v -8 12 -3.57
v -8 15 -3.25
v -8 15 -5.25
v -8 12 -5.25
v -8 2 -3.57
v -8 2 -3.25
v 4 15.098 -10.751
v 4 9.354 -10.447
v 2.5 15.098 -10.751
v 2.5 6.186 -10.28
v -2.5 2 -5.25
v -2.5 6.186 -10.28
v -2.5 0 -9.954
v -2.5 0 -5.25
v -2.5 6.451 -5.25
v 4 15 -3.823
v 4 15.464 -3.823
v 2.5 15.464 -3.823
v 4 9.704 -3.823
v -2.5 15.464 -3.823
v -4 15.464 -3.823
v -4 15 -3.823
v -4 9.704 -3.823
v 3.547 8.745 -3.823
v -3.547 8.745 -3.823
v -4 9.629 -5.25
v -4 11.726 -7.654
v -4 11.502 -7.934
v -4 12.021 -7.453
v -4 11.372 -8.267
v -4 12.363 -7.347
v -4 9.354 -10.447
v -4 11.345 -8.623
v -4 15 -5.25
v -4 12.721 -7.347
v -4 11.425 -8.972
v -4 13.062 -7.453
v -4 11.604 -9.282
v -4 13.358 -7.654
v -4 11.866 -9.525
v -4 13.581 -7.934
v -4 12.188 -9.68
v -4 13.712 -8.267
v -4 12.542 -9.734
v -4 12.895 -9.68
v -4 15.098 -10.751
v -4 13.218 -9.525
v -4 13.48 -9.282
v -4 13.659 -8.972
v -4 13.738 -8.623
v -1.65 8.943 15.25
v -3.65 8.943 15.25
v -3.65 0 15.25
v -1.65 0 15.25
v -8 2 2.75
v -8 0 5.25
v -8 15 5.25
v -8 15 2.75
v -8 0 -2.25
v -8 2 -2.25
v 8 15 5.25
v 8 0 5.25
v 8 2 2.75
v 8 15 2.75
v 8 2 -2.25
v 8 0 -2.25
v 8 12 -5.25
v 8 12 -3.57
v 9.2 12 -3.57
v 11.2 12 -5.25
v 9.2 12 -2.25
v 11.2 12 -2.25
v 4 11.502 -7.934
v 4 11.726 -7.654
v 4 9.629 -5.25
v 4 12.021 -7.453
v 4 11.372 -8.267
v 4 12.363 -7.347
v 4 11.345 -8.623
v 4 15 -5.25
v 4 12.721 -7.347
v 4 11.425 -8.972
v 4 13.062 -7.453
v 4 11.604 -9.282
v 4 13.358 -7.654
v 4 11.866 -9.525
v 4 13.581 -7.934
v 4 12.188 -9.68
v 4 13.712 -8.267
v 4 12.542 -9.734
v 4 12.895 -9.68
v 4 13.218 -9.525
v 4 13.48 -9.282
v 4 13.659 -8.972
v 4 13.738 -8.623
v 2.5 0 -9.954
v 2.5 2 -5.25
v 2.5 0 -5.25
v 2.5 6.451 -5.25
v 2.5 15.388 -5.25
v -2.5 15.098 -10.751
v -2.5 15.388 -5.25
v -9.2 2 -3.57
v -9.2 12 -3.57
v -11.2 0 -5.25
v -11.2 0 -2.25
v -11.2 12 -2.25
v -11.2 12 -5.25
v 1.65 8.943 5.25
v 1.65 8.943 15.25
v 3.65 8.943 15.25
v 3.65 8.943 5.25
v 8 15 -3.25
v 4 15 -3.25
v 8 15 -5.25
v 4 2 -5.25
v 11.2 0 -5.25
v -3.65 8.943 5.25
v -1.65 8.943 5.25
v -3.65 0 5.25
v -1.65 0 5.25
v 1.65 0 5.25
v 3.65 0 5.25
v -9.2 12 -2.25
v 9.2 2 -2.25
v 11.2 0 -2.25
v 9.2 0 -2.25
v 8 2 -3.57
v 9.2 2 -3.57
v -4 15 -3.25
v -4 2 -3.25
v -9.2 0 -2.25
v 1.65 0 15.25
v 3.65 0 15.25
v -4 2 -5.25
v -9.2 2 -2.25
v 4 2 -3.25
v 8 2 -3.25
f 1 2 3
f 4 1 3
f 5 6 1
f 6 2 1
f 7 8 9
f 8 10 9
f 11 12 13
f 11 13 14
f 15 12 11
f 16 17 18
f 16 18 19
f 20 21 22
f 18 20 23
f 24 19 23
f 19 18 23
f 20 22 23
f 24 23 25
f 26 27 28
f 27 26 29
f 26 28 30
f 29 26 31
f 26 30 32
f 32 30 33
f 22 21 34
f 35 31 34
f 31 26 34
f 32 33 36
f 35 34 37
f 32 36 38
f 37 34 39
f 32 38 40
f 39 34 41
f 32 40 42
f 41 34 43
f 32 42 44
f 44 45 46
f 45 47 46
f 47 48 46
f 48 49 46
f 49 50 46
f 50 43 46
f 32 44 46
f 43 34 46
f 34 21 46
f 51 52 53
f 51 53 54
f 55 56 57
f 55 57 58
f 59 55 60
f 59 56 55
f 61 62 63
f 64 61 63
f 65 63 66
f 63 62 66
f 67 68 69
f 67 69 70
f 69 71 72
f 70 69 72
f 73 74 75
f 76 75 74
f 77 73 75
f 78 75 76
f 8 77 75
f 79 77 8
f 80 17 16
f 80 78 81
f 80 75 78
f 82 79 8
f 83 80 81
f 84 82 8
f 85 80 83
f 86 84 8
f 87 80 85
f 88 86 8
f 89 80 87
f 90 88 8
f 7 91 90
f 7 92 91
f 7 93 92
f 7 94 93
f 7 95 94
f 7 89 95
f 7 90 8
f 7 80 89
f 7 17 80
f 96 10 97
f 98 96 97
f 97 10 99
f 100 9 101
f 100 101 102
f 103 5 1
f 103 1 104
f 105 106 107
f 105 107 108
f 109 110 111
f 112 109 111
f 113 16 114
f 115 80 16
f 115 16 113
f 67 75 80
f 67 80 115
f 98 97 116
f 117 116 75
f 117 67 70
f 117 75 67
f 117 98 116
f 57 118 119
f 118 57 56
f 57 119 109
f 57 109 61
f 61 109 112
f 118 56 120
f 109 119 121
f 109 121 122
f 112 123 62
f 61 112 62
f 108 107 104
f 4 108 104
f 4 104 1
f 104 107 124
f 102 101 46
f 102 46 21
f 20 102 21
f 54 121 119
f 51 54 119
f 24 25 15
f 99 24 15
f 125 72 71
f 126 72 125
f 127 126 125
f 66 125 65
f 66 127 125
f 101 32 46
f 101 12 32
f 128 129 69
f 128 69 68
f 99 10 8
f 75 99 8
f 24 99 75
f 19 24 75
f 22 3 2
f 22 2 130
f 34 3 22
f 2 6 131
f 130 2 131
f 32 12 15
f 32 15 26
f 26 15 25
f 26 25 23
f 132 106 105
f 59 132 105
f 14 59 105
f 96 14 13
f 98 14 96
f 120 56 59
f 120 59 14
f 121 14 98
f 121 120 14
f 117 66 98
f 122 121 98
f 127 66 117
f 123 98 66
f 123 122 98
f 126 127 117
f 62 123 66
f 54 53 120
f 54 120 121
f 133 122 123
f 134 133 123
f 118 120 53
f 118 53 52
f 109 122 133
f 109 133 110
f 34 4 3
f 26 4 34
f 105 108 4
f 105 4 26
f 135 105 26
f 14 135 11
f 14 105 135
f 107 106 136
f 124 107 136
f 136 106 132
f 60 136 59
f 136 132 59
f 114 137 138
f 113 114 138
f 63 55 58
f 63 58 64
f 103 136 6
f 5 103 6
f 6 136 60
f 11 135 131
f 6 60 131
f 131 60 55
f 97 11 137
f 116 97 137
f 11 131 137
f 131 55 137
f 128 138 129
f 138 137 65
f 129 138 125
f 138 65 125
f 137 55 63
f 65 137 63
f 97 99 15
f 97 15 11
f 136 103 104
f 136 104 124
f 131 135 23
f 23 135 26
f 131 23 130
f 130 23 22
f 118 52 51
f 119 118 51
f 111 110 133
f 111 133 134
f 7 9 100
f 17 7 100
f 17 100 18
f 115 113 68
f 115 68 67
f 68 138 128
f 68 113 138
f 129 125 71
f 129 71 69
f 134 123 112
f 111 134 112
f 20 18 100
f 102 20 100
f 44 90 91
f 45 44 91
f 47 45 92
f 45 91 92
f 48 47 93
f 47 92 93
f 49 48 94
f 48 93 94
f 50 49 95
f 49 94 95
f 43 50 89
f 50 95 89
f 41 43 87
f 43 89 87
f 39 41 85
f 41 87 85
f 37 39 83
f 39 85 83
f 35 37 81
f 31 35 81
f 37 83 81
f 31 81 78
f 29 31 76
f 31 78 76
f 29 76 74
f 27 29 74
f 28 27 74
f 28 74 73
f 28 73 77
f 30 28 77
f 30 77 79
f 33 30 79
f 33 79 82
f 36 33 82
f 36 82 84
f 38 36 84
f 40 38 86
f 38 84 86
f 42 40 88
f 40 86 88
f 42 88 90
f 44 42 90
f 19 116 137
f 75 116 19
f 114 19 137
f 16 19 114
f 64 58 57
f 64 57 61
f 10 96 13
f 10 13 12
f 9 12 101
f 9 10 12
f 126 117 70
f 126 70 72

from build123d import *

# Parameters (mm, degrees)
SKETCH_1_W          = 16
SKETCH_1_H          = 6
EXTRUDE_1_DEPTH     = 2
SKETCH_1_3_W        = 16
SKETCH_1_3_H        = 2
SKETCH_1_3_H_2      = 2.5
EXTRUDE_2_DEPTH     = 15
SKETCH_2_W          = 8
SKETCH_2_H          = 26
CUT_EXTRUDE_1_DEPTH = 2
EXTRUDE_3_DEPTH     = 2.5
EXTRUDE_4_DEPTH     = 5
EXTRUDE_5_DEPTH     = 1.5
CUT_EXTRUDE_START   = -6.633865
CUT_EXTRUDE_3_DEPTH = 6.633865
SKETCH_8_R          = 1.2
CUT_EXTRUDE_4_DEPTH = 8
SKETCH_9_W          = 1.2
SKETCH_9_H          = 1.320432063
EXTRUDE_6_DEPTH     = 2
EXTRUDE_7_DEPTH     = 12
SKETCH_10_W         = 2
SKETCH_10_H         = 8.943097661
EXTRUDE_8_DEPTH     = 10


with BuildPart() as part:
    # 草图1 → 凸台-拉伸1 (new body)
    with BuildSketch(Plane(origin=(0, 0, 0), x_dir=(1, 0, 0), z_dir=(0, 1, 0))):
        with Locations((0, 0.25)):
            Rectangle(SKETCH_1_W, SKETCH_1_H)
    extrude(amount=EXTRUDE_1_DEPTH)

    # 草图1<3> → 凸台-拉伸2 (add)
    with BuildSketch(Plane(origin=(0, 0, 0), x_dir=(1, 0, 0), z_dir=(0, 1, 0))):
        with Locations((0, 4.25)):
            Rectangle(SKETCH_1_3_W, SKETCH_1_3_H)
        with Locations((0, -4)):
            Rectangle(SKETCH_1_3_W, SKETCH_1_3_H_2)
    extrude(amount=EXTRUDE_2_DEPTH)

    # 草图2 → 切除-拉伸1 (cut)
    with BuildSketch(Plane(origin=(0, 0, -5.25), x_dir=(-1, 0, 0), z_dir=(0, 0, -1))):
        with Locations((0, 15)):
            Rectangle(SKETCH_2_W, SKETCH_2_H)
    extrude(amount=-CUT_EXTRUDE_1_DEPTH, mode=Mode.SUBTRACT)

    # 草图3 → 凸台-拉伸3 (add, symmetric)
    with BuildSketch(Plane(origin=(0, 0, 0), x_dir=(0, 0, -1), z_dir=(1, 0, 0))):
        Polygon((5.25, 0), (9.953715529, 0), (10.750589922, 15.09810313), (5.25, 15.388422994), align=None)
    extrude(amount=EXTRUDE_3_DEPTH, both=True)

    # 草图5 → 凸台-拉伸4 (add)
    with BuildSketch(Plane(origin=(2.5, 0, 0), x_dir=(0, 0, -1), z_dir=(1, 0, 0))):
        Polygon((5.25, 6.451105389), (3.822798244, 8.744995241), (3.822798244, 15.463750373), (5.25, 15.388422994), align=None)
    extrude(amount=-EXTRUDE_4_DEPTH)

    # 草图6 → 凸台-拉伸5 (add)
    with BuildSketch(Plane.ZY.offset(2.5)):
        Polygon((-5.25, 6.451105389), (-10.280190758, 6.185613084), (-10.750589922, 15.09810313), (-3.822798244, 15.463750373), (-3.822798244, 8.744995241), align=None)
    extrude_5 = extrude(amount=EXTRUDE_5_DEPTH)

    # 草图7 → 切除-拉伸3 (cut)
    with BuildSketch(Plane(origin=(0, -0.523895387, -9.926064452), x_dir=(-1, 0, 0), z_dir=(0, -0.052706408, -0.998610051)).offset(CUT_EXTRUDE_START)):
        Polygon((2.5, 6.718847324), (4, 9.892111055), (4, 6.718847324), align=None)
    cut_extrude_3 = extrude(amount=CUT_EXTRUDE_3_DEPTH, mode=Mode.SUBTRACT)

    # 镜向2: 凸台-拉伸5, 切除-拉伸3 across plane
    add(extrude_5.mirror(Plane(origin=(0, 0, 0), x_dir=(0, 0, 1), z_dir=(1, 0, 0))))
    add(cut_extrude_3.mirror(Plane(origin=(0, 0, 0), x_dir=(0, 0, 1), z_dir=(1, 0, 0))), mode=Mode.SUBTRACT)

    # 草图8 → 切除-拉伸4 (cut)
    with BuildSketch(Plane(origin=(4, 0, 0), x_dir=(0, 0, -1), z_dir=(1, 0, 0))):
        with Locations((8.533675648, 12.541707299)):
            Circle(SKETCH_8_R)
    extrude(amount=-CUT_EXTRUDE_4_DEPTH, mode=Mode.SUBTRACT)

    # 草图9 → 凸台-拉伸6 (add)
    with BuildSketch(Plane.XZ):
        with Locations((8.6, -2.910216032)):
            Rectangle(SKETCH_9_W, SKETCH_9_H)
        with Locations((-8.6, -2.910216032)):
            Rectangle(SKETCH_9_W, SKETCH_9_H)
    extrude(amount=-EXTRUDE_6_DEPTH)

    # 草图9<3> → 凸台-拉伸7 (add)
    with BuildSketch(Plane.XZ):
        Polygon((8, -3.570432063), (8, -5.25), (11.2, -5.25), (11.2, -2.25), (9.2, -2.25), (9.2, -3.570432063), align=None)
        Polygon((-8, -5.25), (-8, -3.570432063), (-9.2, -3.570432063), (-9.2, -2.25), (-11.2, -2.25), (-11.2, -5.25), align=None)
    extrude(amount=-EXTRUDE_7_DEPTH)

    # 草图10 → 凸台-拉伸8 (add)
    with BuildSketch(Plane.XY.offset(5.25)):
        with Locations((2.65, 4.471548831)):
            Rectangle(SKETCH_10_W, SKETCH_10_H)
        with Locations((-2.65, 4.471548831)):
            Rectangle(SKETCH_10_W, SKETCH_10_H)
    extrude(amount=EXTRUDE_8_DEPTH)


solid = part.part
